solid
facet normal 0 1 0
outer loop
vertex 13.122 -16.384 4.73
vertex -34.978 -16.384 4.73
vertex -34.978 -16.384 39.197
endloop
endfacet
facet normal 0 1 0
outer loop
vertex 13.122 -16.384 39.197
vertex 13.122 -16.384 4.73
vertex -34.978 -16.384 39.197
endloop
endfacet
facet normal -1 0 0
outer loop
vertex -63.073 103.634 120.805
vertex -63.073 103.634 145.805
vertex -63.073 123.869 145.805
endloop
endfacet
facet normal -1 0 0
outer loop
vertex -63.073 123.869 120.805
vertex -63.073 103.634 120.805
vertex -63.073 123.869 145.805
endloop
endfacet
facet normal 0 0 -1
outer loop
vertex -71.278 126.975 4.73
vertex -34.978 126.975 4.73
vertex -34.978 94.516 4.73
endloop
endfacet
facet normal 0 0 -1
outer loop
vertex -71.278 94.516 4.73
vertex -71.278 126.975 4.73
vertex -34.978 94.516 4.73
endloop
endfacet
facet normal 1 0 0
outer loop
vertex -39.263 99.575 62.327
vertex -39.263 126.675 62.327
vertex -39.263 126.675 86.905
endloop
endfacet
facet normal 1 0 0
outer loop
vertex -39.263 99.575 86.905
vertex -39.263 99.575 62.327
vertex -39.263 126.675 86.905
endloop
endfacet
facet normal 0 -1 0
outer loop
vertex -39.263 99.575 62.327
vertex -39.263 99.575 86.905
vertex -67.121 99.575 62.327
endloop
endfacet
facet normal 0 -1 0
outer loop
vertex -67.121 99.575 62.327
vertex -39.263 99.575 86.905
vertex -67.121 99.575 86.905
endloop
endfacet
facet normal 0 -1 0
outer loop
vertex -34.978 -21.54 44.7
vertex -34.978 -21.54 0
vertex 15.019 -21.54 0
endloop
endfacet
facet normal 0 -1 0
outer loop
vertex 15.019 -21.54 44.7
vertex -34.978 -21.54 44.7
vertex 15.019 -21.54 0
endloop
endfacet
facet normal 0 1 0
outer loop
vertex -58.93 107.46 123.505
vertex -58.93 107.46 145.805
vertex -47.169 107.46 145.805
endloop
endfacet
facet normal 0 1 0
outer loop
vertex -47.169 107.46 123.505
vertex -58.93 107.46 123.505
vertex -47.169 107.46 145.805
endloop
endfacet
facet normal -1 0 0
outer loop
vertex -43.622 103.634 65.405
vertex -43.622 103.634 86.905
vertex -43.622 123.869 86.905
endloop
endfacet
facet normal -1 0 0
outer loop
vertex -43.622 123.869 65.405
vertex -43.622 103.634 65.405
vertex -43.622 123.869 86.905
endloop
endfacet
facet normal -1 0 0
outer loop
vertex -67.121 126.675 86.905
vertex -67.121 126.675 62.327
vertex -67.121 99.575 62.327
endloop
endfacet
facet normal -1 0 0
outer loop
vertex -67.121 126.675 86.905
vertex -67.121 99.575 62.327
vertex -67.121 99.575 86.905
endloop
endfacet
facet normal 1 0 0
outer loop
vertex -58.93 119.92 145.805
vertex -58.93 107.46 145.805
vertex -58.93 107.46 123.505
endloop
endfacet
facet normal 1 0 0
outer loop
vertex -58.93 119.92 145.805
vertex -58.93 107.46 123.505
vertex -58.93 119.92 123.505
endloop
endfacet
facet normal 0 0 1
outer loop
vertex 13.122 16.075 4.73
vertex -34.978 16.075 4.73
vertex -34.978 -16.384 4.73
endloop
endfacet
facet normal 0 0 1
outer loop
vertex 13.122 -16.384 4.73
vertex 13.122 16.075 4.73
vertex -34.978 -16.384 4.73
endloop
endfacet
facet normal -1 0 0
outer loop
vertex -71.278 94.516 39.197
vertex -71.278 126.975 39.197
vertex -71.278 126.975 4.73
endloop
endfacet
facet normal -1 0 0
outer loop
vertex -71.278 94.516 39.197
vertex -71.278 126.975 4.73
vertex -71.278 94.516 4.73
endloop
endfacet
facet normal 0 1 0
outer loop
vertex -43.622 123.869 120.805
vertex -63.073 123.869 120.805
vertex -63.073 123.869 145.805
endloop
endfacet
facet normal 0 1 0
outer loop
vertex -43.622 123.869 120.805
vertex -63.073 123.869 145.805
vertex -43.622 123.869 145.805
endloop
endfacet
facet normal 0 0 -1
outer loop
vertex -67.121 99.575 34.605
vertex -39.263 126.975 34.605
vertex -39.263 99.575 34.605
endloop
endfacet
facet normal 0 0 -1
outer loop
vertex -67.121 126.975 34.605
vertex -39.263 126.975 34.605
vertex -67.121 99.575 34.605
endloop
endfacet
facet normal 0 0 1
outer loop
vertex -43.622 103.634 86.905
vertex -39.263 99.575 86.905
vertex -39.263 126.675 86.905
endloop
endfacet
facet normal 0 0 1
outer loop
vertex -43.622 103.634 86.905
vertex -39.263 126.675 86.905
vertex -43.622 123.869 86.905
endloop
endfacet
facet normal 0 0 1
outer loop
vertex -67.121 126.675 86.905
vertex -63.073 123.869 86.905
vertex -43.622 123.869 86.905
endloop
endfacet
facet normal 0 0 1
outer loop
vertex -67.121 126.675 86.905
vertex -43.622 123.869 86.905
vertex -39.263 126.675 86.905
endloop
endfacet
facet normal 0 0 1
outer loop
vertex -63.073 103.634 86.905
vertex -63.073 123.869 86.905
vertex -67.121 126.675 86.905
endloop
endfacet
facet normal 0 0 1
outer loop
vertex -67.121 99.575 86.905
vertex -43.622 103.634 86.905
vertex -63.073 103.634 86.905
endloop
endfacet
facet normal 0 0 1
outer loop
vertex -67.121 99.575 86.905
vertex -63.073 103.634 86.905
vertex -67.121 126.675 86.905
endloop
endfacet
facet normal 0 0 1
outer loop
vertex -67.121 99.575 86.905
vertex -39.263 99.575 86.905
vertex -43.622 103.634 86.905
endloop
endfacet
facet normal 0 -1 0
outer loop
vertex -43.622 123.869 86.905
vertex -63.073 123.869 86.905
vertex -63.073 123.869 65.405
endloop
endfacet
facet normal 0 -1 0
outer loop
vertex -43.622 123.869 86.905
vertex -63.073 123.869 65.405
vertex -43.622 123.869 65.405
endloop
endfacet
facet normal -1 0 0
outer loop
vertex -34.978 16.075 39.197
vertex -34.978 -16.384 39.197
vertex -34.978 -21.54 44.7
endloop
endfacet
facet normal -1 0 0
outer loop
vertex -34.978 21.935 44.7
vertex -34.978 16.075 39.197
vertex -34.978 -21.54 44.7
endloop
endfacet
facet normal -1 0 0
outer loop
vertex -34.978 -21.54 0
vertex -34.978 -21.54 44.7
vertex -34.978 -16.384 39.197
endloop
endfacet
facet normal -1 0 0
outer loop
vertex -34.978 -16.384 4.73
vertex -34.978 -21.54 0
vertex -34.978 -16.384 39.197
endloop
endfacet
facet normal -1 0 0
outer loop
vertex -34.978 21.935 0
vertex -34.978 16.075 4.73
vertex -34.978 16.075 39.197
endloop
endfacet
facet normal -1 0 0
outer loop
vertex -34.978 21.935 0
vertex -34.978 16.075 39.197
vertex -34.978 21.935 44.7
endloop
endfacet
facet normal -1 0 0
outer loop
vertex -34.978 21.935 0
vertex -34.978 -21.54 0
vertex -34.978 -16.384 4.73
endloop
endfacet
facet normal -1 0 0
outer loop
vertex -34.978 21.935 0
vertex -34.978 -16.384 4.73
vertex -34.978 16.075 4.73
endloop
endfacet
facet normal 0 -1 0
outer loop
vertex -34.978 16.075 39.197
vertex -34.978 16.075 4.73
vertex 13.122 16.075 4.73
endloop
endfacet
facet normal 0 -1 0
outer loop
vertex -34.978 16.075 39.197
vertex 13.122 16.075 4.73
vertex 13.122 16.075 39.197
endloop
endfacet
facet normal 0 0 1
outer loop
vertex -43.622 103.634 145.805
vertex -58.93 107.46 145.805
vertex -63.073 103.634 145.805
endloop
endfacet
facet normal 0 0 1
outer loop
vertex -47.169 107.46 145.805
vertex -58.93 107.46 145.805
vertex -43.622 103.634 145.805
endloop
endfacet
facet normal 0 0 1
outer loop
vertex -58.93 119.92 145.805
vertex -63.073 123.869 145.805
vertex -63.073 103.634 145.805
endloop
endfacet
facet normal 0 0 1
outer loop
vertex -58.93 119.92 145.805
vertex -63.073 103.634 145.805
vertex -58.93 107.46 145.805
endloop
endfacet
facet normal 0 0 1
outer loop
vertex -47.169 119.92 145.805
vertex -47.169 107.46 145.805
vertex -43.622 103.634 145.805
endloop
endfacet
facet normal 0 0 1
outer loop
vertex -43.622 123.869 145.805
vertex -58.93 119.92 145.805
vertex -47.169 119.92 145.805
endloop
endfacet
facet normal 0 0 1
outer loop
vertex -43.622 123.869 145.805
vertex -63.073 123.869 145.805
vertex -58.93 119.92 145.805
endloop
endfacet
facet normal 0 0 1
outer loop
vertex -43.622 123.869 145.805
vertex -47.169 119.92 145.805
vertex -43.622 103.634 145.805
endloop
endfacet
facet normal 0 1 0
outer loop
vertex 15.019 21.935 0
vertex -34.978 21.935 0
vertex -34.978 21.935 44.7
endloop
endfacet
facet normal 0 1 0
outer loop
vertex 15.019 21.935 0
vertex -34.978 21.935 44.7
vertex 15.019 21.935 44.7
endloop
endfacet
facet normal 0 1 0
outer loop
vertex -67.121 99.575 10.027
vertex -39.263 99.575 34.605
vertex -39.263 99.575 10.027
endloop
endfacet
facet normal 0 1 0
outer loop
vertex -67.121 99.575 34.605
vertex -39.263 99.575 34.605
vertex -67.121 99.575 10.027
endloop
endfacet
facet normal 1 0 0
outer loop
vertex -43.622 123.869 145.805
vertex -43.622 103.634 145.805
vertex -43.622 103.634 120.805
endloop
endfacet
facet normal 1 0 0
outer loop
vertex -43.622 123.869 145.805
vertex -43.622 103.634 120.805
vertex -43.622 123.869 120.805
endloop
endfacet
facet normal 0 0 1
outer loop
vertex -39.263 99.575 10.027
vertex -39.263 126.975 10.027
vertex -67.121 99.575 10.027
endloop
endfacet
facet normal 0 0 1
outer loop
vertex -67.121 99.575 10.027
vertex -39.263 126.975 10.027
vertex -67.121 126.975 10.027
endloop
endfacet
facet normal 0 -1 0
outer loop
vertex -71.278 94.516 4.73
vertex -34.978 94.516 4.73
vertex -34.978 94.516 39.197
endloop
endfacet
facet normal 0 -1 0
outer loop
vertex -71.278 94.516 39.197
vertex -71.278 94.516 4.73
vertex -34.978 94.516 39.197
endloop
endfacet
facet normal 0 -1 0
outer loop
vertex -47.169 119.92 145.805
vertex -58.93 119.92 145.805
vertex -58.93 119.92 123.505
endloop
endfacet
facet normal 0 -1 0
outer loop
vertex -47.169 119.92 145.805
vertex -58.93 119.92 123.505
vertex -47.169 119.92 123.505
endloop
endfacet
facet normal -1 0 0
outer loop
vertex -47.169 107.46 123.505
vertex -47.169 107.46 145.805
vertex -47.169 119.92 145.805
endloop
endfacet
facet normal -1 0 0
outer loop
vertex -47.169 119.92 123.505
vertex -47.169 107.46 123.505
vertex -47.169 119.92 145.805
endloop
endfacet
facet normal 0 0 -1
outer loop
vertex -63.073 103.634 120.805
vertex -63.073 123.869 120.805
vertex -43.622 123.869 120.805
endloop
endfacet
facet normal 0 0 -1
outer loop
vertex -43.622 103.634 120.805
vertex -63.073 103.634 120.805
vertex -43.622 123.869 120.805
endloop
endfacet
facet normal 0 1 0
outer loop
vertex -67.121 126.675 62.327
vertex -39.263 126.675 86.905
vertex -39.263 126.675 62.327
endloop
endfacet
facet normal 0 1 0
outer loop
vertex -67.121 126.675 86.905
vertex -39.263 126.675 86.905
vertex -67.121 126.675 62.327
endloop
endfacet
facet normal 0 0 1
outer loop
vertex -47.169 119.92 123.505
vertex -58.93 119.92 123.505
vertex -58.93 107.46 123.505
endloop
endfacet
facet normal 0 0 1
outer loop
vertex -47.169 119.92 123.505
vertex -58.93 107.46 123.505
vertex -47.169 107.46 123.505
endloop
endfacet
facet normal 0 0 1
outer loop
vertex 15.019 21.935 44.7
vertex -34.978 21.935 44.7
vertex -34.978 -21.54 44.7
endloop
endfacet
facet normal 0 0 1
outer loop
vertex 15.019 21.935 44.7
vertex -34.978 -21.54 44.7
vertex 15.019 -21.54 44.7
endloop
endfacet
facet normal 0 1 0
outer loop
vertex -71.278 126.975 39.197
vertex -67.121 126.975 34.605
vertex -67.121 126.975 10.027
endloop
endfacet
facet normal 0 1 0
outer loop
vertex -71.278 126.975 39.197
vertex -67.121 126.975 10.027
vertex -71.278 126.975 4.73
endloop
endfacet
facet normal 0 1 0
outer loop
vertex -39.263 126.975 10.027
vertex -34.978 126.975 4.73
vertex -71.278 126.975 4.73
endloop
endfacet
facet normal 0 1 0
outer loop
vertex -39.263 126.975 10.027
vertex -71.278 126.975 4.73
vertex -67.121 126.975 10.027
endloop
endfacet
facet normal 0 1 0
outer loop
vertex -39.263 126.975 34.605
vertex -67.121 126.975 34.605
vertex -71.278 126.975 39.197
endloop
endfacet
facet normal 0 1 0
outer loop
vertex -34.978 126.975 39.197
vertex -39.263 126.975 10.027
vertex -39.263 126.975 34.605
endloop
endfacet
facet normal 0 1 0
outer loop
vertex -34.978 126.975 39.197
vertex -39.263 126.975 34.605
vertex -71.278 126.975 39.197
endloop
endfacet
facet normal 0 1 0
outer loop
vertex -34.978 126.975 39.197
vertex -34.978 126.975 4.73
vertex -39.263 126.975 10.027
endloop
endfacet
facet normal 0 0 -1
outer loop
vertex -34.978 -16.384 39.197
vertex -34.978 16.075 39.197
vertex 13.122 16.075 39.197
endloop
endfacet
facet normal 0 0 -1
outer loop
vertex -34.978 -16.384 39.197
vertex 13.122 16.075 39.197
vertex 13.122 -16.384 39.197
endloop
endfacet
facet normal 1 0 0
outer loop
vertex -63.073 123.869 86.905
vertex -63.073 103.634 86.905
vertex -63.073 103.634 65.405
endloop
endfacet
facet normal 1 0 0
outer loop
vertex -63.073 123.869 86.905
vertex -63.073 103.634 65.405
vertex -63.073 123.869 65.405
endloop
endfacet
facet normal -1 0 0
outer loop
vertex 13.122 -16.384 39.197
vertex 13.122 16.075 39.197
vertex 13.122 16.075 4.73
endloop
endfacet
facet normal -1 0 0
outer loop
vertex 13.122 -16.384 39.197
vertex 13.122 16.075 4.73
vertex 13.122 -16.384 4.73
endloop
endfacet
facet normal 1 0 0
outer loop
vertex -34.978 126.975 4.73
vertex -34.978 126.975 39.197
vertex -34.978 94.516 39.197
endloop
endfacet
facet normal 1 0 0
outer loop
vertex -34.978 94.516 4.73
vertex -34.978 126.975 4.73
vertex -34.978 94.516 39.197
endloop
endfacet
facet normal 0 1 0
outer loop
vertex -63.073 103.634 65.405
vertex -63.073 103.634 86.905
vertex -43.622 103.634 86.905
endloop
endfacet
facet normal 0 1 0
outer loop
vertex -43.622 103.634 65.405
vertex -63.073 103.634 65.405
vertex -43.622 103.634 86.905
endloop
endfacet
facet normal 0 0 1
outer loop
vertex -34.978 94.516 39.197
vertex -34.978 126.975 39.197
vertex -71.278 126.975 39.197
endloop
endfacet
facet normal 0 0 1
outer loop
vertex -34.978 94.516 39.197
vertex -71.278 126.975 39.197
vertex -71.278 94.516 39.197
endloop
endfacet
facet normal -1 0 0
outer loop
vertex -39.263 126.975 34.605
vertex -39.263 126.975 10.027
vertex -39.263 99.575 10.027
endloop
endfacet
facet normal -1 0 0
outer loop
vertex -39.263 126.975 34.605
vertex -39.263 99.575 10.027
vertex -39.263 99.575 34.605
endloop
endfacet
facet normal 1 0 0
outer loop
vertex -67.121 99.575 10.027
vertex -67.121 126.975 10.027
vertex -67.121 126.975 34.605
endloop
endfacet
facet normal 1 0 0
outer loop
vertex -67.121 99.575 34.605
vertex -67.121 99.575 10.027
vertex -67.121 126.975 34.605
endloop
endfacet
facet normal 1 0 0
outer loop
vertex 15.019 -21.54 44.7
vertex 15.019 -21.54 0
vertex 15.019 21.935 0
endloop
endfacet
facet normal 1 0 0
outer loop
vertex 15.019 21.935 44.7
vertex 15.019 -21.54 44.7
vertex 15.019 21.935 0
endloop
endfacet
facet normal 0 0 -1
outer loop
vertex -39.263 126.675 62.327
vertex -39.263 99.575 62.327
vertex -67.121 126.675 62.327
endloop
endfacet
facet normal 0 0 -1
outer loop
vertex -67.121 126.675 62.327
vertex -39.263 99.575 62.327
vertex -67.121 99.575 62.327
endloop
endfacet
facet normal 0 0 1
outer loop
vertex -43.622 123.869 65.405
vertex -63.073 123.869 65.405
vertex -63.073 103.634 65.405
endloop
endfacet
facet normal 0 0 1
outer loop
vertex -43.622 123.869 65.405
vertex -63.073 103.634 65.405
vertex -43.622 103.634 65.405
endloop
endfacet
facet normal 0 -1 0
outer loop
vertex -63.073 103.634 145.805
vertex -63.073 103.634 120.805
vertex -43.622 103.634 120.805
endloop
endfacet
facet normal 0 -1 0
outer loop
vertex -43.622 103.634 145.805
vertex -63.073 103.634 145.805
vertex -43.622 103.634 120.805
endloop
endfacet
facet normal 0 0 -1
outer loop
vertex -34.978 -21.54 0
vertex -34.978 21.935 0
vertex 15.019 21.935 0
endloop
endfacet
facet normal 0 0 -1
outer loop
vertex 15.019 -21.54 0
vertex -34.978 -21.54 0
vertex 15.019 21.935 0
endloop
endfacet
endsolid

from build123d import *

# Parameters (mm, degrees)
F0_W      = 49.996865
F0_H      = 43.475535
F1_DEPTH  = 44.7
F2_W      = 32.458292
F2_H      = 34.467615
F3_DEPTH  = 48.1
F4_DEPTH  = 36.3
F6_W      = 27.858592
F6_H      = 24.578292
F7_DEPTH  = 27.4
F7_FACE_W = 27.858592
F7_FACE_H = 24.578292
F8_DEPTH  = 27.1
F10_W     = 19.451398
F10_H     = 20.234935
F11_DEPTH = 21.5
F12_DEPTH = 25
F14_W     = 11.760708
F14_H     = 12.460396
F15_DEPTH = 22.3


with BuildPart() as f1:
    # F0 (on Top) → F1 (new body)
    with BuildSketch(Plane.XY):
        with Locations((-9.97961, 0.197617)):
            Rectangle(F0_W, F0_H)
    extrude(amount=F1_DEPTH)

    # F2 (on face) → F3 (cut)
    with BuildSketch(Plane(origin=(-34.978043, 0, 0), x_dir=(0, -1, 0), z_dir=(-1, 0, 0))):
        with Locations((0.154563, 21.963592)):
            Rectangle(F2_W, F2_H)
    extrude(amount=-F3_DEPTH, mode=Mode.SUBTRACT)


with BuildPart() as f4:
    # F2 (on face) → F4 (new body)
    with BuildSketch(Plane(origin=(-34.978043, 0, 0), x_dir=(0, -1, 0), z_dir=(-1, 0, 0))):
        with Locations((0.154563, 21.963592)):
            Rectangle(F2_W, F2_H)
    extrude(amount=F4_DEPTH)


with BuildPart() as f4_1:
    # F5: moved
    add(f4.part.moved(Location((0, 110.9, 0))))

    # F6 (on face) → F7 (cut)
    with BuildSketch(Plane(origin=(0, 126.974583, 0), x_dir=(-1, 0, 0), z_dir=(0, 1, 0))):
        with Locations((53.191889, 22.316037)):
            Rectangle(F6_W, F6_H)
    extrude(amount=-F7_DEPTH, mode=Mode.SUBTRACT)


with BuildPart() as f8:
    # F7_face (on face) → F8 (new body)
    with BuildSketch(Plane(origin=(-53.191889, 99.574583, 22.316037), x_dir=(-1, 0, 0), z_dir=(0, 1, 0))):
        Rectangle(F7_FACE_W, F7_FACE_H)
    extrude(amount=F8_DEPTH)


with BuildPart() as f8_1:
    # F9: moved
    add(f8.part.moved(Location((0, 0, 52.3))))

    # F10 (on face) → F11 (cut)
    with BuildSketch(Plane.XY.offset(86.905183)):
        with Locations((-53.347355, 113.751422)):
            Rectangle(F10_W, F10_H)
    extrude(amount=-F11_DEPTH, mode=Mode.SUBTRACT)


with BuildPart() as f12:
    # F10 (on face) → F12 (new body)
    with BuildSketch(Plane.XY.offset(86.905183)):
        with Locations((-53.347355, 113.751422)):
            Rectangle(F10_W, F10_H)
    extrude(amount=F12_DEPTH)


with BuildPart() as f12_1:
    # F13: moved
    add(f12.part.moved(Location((0, 0, 33.9))))

    # F14 (on face) → F15 (cut)
    with BuildSketch(Plane.XY.offset(145.805183)):
        with Locations((-53.049704, 113.690011)):
            Rectangle(F14_W, F14_H)
    extrude(amount=-F15_DEPTH, mode=Mode.SUBTRACT)


solid = Compound([f1.part, f4_1.part, f8_1.part, f12_1.part])
